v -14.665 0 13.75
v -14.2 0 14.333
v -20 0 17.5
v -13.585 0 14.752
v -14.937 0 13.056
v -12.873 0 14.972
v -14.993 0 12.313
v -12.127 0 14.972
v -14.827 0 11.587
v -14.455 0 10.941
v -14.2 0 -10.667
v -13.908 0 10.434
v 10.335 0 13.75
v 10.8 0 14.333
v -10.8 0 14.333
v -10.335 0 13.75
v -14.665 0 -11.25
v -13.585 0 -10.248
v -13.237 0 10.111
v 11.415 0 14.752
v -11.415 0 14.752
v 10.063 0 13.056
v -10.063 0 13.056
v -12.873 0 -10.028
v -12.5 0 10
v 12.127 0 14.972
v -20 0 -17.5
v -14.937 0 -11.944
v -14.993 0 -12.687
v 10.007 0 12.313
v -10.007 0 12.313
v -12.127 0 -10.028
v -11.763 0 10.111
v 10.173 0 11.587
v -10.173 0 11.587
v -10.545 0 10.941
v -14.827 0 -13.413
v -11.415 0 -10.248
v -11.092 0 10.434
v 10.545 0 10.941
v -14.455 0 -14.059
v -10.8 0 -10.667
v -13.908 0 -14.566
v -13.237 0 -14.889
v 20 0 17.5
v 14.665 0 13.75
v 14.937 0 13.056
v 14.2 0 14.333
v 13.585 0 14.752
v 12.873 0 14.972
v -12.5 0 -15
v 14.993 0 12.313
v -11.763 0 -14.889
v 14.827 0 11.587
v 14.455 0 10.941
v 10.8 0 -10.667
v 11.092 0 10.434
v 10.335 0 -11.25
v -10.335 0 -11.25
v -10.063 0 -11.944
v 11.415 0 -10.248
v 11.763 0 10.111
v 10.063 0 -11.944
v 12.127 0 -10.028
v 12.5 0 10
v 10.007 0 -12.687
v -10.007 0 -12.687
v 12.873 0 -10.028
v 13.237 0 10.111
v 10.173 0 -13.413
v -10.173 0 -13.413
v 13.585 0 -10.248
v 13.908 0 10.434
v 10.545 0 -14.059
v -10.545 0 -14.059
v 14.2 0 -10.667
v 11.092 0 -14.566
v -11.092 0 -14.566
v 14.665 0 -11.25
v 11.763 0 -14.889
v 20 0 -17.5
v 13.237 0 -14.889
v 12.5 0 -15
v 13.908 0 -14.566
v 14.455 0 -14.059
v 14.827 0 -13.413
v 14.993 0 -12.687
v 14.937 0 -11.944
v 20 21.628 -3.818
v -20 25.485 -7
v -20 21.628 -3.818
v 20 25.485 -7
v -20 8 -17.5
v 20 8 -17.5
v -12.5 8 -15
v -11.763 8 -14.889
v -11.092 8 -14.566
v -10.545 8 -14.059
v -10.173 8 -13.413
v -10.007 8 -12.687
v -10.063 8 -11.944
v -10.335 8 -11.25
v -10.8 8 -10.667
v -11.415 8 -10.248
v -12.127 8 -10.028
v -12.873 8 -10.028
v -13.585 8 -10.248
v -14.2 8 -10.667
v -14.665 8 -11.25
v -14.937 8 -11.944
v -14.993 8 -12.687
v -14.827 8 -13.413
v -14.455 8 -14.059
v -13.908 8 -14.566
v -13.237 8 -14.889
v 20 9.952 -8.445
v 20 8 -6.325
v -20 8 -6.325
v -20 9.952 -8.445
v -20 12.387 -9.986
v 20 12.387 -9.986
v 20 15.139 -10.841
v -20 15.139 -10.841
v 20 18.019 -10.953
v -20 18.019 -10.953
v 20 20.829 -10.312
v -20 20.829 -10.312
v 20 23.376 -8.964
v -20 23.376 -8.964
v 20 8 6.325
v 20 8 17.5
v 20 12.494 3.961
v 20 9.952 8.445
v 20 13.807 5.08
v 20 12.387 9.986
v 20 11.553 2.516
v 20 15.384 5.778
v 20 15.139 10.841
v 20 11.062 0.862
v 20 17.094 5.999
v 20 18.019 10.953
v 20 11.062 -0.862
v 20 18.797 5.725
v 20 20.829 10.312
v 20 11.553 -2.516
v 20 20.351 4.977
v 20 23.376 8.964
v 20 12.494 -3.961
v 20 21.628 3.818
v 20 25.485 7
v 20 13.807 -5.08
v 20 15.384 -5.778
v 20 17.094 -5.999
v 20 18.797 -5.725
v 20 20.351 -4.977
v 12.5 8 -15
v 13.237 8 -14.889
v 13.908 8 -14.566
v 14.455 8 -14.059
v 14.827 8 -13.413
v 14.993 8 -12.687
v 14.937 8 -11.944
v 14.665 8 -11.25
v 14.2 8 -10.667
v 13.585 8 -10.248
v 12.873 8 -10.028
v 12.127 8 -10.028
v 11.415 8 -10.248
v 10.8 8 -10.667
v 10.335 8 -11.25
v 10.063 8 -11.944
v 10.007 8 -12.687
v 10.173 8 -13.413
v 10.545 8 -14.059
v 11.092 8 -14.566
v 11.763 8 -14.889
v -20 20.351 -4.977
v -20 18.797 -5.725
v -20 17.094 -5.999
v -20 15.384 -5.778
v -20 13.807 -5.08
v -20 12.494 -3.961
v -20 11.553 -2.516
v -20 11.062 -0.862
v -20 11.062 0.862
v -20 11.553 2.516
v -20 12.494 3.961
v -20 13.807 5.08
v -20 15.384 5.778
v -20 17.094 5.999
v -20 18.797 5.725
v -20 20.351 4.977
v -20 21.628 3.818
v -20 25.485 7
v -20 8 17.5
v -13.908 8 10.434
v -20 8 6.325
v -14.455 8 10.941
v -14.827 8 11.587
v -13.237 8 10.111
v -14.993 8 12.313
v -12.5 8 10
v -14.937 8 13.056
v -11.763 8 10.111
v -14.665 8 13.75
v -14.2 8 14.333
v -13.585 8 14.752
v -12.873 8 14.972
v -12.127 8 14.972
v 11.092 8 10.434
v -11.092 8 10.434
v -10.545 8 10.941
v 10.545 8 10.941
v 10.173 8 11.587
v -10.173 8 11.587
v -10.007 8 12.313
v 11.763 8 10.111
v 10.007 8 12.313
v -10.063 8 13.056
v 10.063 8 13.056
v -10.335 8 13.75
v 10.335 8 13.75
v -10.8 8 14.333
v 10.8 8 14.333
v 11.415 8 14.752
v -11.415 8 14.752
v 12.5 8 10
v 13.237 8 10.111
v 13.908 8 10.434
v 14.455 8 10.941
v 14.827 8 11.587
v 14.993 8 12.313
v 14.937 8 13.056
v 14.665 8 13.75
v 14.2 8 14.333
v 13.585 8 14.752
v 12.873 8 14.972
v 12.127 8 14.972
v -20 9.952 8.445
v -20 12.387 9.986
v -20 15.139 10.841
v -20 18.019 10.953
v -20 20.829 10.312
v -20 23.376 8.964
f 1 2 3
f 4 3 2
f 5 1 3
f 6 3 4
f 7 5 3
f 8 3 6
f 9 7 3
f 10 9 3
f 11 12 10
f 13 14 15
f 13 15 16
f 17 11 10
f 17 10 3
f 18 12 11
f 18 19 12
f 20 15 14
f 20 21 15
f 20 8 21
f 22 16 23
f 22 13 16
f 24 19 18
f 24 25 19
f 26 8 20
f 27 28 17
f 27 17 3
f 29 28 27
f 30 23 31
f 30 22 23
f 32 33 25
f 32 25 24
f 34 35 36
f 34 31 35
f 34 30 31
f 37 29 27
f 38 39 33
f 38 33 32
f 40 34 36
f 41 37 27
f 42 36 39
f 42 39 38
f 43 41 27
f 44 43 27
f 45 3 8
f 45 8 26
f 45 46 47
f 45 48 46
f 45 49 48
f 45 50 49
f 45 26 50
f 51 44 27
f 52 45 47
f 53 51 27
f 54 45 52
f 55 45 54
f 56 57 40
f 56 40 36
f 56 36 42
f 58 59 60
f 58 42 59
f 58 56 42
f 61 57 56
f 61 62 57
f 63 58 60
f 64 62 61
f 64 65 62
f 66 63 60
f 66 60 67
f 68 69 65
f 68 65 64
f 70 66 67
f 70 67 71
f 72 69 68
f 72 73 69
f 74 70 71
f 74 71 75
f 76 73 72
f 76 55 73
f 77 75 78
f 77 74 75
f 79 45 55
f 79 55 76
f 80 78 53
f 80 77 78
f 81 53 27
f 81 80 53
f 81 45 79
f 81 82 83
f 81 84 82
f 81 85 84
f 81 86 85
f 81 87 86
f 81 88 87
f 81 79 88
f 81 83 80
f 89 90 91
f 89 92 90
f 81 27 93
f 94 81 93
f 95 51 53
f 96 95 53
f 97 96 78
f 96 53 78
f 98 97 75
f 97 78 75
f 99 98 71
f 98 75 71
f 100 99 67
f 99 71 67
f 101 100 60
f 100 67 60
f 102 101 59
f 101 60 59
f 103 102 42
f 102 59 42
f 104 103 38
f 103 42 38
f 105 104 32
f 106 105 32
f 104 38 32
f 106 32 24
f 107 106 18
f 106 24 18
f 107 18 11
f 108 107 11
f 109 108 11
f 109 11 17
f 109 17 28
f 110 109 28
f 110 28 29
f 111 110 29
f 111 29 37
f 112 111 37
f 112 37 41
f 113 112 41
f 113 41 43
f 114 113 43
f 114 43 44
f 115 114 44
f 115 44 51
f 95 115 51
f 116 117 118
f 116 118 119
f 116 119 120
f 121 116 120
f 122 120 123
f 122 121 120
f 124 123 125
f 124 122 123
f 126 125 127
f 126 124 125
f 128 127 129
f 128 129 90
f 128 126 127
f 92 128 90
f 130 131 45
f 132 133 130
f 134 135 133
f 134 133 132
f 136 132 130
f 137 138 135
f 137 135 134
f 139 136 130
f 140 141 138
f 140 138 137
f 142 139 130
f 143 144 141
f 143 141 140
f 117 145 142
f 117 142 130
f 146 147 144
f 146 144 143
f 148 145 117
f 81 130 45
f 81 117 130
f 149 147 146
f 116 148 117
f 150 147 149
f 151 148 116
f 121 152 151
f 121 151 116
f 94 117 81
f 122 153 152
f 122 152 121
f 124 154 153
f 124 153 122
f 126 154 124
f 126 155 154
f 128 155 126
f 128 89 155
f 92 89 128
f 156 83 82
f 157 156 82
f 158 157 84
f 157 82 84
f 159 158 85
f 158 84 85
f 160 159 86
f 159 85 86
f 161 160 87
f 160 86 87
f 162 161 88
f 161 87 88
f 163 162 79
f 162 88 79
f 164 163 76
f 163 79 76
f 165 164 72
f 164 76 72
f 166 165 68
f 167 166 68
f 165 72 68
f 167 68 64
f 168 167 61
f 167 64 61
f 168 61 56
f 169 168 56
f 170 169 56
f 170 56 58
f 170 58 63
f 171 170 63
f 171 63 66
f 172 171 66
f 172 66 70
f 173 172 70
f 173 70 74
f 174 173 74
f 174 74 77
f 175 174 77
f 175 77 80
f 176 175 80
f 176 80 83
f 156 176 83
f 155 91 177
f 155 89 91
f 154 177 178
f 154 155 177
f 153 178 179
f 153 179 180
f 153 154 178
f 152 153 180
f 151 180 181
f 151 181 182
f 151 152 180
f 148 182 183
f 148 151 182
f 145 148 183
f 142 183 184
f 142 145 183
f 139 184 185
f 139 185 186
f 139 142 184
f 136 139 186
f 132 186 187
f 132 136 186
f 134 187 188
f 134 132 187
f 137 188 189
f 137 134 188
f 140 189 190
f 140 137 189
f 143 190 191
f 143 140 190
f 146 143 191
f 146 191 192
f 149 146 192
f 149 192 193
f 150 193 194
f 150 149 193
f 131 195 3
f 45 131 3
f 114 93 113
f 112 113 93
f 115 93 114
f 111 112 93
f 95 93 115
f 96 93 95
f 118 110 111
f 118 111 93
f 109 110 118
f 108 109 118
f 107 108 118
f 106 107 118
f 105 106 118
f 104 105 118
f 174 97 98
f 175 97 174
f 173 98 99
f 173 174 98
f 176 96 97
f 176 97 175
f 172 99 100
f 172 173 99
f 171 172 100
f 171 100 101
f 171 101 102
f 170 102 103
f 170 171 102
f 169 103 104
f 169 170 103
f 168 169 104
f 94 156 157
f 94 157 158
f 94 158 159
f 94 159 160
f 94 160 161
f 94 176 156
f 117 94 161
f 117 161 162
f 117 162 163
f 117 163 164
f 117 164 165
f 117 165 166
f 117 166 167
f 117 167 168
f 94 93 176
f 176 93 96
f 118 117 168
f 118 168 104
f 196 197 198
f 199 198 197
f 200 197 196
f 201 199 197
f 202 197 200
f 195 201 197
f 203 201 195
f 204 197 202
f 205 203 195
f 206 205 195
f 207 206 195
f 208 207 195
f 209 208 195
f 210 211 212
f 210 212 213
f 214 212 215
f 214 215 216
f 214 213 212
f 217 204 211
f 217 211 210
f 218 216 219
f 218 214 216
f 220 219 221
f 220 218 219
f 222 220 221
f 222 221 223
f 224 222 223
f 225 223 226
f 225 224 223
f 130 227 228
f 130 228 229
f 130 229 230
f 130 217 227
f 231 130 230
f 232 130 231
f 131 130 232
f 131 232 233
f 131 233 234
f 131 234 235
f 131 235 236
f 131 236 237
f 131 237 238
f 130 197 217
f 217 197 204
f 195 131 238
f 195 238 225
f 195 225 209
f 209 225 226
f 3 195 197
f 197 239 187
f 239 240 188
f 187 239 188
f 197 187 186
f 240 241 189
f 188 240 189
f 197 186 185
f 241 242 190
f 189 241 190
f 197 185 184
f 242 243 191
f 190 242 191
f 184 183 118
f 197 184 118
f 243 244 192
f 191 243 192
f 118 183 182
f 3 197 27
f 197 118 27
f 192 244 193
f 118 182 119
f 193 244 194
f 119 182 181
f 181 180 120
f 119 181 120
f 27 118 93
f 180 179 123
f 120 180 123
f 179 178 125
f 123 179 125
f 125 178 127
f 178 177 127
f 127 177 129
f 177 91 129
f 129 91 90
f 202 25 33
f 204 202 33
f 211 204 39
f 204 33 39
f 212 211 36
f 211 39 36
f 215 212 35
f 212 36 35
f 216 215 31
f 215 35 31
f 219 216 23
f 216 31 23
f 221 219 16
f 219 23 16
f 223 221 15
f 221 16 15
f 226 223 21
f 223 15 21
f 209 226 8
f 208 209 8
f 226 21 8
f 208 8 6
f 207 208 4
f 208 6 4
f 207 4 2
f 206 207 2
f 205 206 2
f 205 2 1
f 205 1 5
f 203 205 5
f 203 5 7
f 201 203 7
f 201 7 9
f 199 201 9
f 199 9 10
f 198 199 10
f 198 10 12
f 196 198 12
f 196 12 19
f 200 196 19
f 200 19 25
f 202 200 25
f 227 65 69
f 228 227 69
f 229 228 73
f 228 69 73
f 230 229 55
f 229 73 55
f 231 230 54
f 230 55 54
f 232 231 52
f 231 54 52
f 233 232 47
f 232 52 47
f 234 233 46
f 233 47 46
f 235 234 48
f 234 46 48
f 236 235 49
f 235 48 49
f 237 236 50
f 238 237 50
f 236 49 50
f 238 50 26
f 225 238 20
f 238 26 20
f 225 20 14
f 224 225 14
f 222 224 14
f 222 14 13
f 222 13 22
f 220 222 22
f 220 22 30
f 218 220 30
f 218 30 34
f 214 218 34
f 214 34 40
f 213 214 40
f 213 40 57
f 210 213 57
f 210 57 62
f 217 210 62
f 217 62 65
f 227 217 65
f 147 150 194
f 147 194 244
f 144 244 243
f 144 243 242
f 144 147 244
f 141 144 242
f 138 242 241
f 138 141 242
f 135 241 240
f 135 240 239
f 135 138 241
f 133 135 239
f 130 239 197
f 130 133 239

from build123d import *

# Parameters (mm, degrees)
EXTRUDE_1_DEPTH     = 20
CUT_EXTRUDE_1_REACH = 38.821
SKETCH_3_R          = 2.5


with BuildPart() as part:
    # Эскиз2 → Бобышка-Вытянуть1 (new, symmetric)
    with BuildSketch(Plane(origin=(0, 0, 0), x_dir=(0, 0, -1), z_dir=(1, 0, 0))):
        with BuildLine():
            Line((-3.818181818, 21.628335295), (-7, 25.485281374))
            ThreePointArc((-7, 25.485281374), (-10.991801936, 16.575394071), (-6.32455532, 8))
            Line((-6.32455532, 8), (-17.5, 8))
            Line((-17.5, 8), (-17.5, 0))
            Line((-17.5, 0), (17.5, 0))
            Line((17.5, 0), (17.5, 8))
            Line((17.5, 8), (6.32455532, 8))
            ThreePointArc((6.32455532, 8), (10.991801936, 16.575394071), (7, 25.485281374))
            Line((7, 25.485281374), (3.818181818, 21.628335295))
            ThreePointArc((3.818181818, 21.628335295), (0, 11), (-3.818181818, 21.628335295))
        make_face()
    extrude(amount=EXTRUDE_1_DEPTH, both=True)

    # Эскиз3 → Вырез-Вытянуть1 (cut, up to next)
    with BuildSketch(Plane.XZ, mode=Mode.PRIVATE) as cut_extrude_1_sk1:
        with Locations(Location((-12.5, 12.5, 0), (0, 0, 270))):
            Circle(SKETCH_3_R)
    cut_extrude_1_tool1 = extrude(cut_extrude_1_sk1.sketch, amount=-CUT_EXTRUDE_1_REACH, mode=Mode.PRIVATE) & part.part
    # Эскиз3 → Вырез-Вытянуть1 (cut, up to next)
    with BuildSketch(Plane.XZ, mode=Mode.PRIVATE) as cut_extrude_1_sk2:
        with Locations(Location((12.5, 12.5, 0), (0, 0, 270))):
            Circle(SKETCH_3_R)
    cut_extrude_1_tool2 = extrude(cut_extrude_1_sk2.sketch, amount=-CUT_EXTRUDE_1_REACH, mode=Mode.PRIVATE) & part.part
    # Эскиз3 → Вырез-Вытянуть1 (cut, up to next)
    with BuildSketch(Plane.XZ, mode=Mode.PRIVATE) as cut_extrude_1_sk3:
        with Locations(Location((-12.5, -12.5, 0), (0, 0, 270))):
            Circle(SKETCH_3_R)
    cut_extrude_1_tool3 = extrude(cut_extrude_1_sk3.sketch, amount=-CUT_EXTRUDE_1_REACH, mode=Mode.PRIVATE) & part.part
    # Эскиз3 → Вырез-Вытянуть1 (cut, up to next)
    with BuildSketch(Plane.XZ, mode=Mode.PRIVATE) as cut_extrude_1_sk4:
        with Locations(Location((12.5, -12.5, 0), (0, 0, 270))):
            Circle(SKETCH_3_R)
    cut_extrude_1_tool4 = extrude(cut_extrude_1_sk4.sketch, amount=-CUT_EXTRUDE_1_REACH, mode=Mode.PRIVATE) & part.part
    add(cut_extrude_1_tool1.solids().sort_by_distance((-12.5, 0, 12.5))[0], mode=Mode.SUBTRACT)
    add(cut_extrude_1_tool2.solids().sort_by_distance((12.5, 0, 12.5))[0], mode=Mode.SUBTRACT)
    add(cut_extrude_1_tool3.solids().sort_by_distance((-12.5, 0, -12.5))[0], mode=Mode.SUBTRACT)
    add(cut_extrude_1_tool4.solids().sort_by_distance((12.5, 0, -12.5))[0], mode=Mode.SUBTRACT)


solid = part.part
